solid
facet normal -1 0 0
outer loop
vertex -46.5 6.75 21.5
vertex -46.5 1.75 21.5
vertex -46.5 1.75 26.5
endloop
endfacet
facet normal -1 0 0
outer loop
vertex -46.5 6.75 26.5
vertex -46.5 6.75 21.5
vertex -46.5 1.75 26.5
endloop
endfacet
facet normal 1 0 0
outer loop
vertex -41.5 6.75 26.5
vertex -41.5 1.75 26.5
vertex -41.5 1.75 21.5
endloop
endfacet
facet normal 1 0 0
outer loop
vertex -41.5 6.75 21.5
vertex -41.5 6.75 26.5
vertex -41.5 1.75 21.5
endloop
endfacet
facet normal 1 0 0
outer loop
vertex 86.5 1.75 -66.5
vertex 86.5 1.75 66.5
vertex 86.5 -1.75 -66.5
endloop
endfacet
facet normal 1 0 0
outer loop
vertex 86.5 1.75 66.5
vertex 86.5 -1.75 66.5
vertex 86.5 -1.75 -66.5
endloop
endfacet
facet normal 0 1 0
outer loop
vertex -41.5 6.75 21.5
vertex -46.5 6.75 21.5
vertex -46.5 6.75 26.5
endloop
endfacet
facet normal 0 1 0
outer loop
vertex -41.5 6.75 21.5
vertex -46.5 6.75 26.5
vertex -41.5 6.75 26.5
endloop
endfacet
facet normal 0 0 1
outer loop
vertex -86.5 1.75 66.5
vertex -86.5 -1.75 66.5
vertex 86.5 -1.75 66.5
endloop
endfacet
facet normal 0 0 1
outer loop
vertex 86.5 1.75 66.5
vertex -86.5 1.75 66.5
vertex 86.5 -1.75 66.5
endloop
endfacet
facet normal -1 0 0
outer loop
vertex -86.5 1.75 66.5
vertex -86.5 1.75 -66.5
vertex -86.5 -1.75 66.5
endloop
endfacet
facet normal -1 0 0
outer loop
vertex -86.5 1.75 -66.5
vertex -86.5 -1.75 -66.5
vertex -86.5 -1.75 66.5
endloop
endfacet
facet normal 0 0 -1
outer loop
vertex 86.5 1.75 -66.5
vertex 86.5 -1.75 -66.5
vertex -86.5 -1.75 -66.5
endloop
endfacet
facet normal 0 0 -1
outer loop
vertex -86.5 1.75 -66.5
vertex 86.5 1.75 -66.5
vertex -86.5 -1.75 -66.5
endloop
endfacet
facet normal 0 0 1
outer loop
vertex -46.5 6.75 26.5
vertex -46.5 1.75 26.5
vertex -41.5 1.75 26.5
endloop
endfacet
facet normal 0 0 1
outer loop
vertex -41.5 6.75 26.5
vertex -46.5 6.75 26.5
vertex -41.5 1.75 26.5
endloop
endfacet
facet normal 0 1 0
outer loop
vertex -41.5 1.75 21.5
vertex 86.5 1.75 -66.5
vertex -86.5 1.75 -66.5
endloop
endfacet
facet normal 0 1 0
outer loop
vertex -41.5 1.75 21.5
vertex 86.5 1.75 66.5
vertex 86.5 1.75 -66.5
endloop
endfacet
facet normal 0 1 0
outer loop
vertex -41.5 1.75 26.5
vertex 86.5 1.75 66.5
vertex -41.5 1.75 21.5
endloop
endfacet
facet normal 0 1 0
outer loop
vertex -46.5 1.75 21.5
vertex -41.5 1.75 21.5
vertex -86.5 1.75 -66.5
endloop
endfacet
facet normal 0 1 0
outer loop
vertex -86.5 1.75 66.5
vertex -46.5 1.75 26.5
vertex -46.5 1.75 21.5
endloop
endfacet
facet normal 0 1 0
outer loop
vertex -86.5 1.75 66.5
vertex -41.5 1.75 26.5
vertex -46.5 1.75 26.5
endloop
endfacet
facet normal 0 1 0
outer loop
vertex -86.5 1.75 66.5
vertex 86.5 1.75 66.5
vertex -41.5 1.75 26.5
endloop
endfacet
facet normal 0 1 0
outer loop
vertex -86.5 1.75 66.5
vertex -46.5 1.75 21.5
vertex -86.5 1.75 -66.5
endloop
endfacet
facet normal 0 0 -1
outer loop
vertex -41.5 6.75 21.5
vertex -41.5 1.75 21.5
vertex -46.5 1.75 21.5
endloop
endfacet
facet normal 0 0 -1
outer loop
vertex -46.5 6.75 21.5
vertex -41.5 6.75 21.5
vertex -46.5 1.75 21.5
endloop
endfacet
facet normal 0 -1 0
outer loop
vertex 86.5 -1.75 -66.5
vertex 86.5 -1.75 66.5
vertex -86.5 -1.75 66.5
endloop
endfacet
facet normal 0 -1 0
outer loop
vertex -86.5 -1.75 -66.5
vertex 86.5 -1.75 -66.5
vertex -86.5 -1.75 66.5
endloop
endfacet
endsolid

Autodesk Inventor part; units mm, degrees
ref_plane "YZ Plane" through (0, 0, 0) normal (1, 0, 0) x (0, 1, 0)
ref_plane "XZ Plane" through (0, 0, 0) normal (0, 1, 0) x (-1, 0, 0)
ref_plane "XY Plane" through (0, 0, 0) normal (0, 0, 1) x (1, 0, 0)
sketch "Náčrt1" plane through (0, 0, 0) normal (0, 1, 0) x (-1, 0, 0)
  line L0 (0, -93.1) -> (0, 93.1) projected
  line L1 (-121.1, 0) -> (121.1, 0) projected
  line L2 (86.5, 66.5) -> (-86.5, 66.5)
  line L3 (-86.5, 66.5) -> (-86.5, -66.5)
  line L4 (-86.5, -66.5) -> (86.5, -66.5)
  line L5 (86.5, -66.5) -> (86.5, 66.5)
  point P0 (0, 0)
  dimension "d0" = 133
  dimension "d1" = 173
extrude "Vysunutí1" add sketch "Náčrt1" along normal mid plane 3.5
sketch "Náčrt2" plane through (0, 1.75, 0) normal (0, 1, 0) x (1, 0, 0)
  line L0 (-46.5, -26.5) -> (-41.5, -26.5)
  line L1 (-41.5, -26.5) -> (-41.5, -21.5)
  line L2 (-41.5, -21.5) -> (-46.5, -21.5)
  line L3 (-46.5, -21.5) -> (-46.5, -26.5)
  line L4 (-86.5, -66.5) -> (86.5, -66.5) projected
  line L5 (-86.5, 66.5) -> (-86.5, -66.5) projected
  point P0 (0, 0)
  dimension "d4" = 5
  dimension "d5" = 5
  dimension "d6" = 40
  dimension "d7" = 40
extrude "Vysunutí2" add sketch "Náčrt2" along normal blind 5
properties part number "Cabinet - left"
